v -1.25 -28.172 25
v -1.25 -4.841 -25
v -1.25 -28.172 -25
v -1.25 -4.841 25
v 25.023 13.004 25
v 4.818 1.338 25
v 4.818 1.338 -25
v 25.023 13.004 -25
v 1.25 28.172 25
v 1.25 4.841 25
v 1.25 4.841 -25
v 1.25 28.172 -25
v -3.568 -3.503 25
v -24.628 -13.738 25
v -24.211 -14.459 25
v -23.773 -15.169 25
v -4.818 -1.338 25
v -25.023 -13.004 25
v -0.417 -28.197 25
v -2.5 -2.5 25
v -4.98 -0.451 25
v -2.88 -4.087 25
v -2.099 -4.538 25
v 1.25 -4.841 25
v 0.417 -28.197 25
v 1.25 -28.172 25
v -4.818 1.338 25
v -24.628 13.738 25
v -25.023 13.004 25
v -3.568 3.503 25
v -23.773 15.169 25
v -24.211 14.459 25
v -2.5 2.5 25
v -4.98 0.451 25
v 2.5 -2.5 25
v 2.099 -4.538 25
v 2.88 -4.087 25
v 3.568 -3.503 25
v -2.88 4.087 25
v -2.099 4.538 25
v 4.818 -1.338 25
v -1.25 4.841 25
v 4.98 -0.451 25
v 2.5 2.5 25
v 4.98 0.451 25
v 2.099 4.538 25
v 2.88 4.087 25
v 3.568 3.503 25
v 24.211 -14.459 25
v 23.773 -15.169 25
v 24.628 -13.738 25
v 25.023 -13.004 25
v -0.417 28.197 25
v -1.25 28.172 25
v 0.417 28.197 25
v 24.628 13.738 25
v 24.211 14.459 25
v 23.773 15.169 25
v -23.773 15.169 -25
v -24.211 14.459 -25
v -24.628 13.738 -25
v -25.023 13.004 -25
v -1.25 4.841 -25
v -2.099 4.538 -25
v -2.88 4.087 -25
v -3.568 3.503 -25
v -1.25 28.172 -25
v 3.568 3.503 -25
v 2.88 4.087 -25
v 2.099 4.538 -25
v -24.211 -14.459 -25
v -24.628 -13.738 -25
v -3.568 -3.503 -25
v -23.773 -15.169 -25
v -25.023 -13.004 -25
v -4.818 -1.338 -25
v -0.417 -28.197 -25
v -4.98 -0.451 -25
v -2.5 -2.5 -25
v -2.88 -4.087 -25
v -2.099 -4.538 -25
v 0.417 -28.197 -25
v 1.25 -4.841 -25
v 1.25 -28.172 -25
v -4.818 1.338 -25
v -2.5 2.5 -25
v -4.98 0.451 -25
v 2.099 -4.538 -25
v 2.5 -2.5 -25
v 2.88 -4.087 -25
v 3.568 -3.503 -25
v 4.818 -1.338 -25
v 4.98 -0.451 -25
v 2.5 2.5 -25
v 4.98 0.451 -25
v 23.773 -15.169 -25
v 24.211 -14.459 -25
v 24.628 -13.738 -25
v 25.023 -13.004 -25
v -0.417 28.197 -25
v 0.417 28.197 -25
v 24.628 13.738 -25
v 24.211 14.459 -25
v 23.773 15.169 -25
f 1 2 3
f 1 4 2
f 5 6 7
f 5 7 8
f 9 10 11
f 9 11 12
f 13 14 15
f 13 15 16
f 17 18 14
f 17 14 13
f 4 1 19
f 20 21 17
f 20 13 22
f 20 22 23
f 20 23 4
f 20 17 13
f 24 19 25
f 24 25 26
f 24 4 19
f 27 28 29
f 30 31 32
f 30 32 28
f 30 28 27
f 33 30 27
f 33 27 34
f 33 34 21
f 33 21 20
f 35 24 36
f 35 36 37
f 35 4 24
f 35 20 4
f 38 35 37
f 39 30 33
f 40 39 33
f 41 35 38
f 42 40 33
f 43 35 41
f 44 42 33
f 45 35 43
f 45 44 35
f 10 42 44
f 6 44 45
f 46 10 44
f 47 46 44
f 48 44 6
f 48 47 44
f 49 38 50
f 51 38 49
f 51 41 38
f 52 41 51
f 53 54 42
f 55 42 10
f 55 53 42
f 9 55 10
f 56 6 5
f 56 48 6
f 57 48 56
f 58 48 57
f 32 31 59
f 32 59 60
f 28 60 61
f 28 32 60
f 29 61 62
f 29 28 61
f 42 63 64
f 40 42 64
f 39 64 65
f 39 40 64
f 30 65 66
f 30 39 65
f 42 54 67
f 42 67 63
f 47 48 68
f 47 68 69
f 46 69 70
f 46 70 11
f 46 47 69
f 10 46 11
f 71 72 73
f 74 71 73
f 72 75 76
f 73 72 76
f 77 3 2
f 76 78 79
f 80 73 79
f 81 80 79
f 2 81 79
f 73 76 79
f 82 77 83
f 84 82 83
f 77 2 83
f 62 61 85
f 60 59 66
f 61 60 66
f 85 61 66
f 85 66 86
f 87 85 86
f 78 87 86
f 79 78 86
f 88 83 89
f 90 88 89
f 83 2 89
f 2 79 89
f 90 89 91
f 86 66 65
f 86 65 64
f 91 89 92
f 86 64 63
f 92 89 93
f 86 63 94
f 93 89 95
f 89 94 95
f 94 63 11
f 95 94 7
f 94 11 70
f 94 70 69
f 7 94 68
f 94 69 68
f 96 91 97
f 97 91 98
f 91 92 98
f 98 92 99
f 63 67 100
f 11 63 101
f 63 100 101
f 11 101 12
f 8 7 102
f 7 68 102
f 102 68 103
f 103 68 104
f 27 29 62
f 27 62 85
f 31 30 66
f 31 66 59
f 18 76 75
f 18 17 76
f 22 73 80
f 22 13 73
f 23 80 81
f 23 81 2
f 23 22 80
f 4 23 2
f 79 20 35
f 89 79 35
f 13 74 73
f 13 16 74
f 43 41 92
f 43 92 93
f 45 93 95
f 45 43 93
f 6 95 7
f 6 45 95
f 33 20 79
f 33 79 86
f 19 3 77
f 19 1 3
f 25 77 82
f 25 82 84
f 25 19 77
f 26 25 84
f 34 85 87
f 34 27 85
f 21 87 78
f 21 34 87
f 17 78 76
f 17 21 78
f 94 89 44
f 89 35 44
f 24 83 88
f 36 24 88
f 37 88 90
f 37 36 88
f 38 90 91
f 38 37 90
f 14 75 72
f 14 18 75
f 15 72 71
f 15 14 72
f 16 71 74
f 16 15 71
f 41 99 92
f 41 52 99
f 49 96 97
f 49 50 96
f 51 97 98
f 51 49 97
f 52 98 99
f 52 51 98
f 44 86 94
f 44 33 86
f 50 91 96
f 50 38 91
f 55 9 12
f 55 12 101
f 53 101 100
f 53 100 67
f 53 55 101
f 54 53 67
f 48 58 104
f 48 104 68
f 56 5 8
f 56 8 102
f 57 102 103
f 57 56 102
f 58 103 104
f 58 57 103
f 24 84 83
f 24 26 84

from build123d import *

# Parameters (mm, degrees)
ESQUISSE1_W        = 5
ESQUISSE1_H        = 5
BOSS_EXTRU_1_DEPTH = 25


with BuildPart() as part:
    # Esquisse1 → Boss.-Extru.1 (new, symmetric)
    with BuildSketch(Plane.XY):
        with BuildLine():
            Line((25.022912308, -13.003609484), (4.817627458, -1.338082837))
            ThreePointArc((4.817627458, -1.338082837), (5, 0), (4.817627458, 1.338082837))
            Line((4.817627458, 1.338082837), (25.022912308, 13.003609484))
            ThreePointArc((25.022912308, 13.003609484), (24.421916387, 14.1), (23.772912308, 15.168672994))
            Line((23.772912308, 15.168672994), (3.567627458, 3.503146346))
            ThreePointArc((3.567627458, 3.503146346), (2.5, 4.330127019), (1.25, 4.841229183))
            Line((1.25, 4.841229183), (1.25, 28.172282478))
            ThreePointArc((1.25, 28.172282478), (0, 28.2), (-1.25, 28.172282478))
            Line((-1.25, 28.172282478), (-1.25, 4.841229183))
            ThreePointArc((-1.25, 4.841229183), (-2.5, 4.330127019), (-3.567627458, 3.503146346))
            Line((-3.567627458, 3.503146346), (-23.772912308, 15.168672994))
            ThreePointArc((-23.772912308, 15.168672994), (-24.421916387, 14.1), (-25.022912308, 13.003609484))
            Line((-25.022912308, 13.003609484), (-4.817627458, 1.338082837))
            ThreePointArc((-4.817627458, 1.338082837), (-5, 0), (-4.817627458, -1.338082837))
            Line((-4.817627458, -1.338082837), (-25.022912308, -13.003609484))
            ThreePointArc((-25.022912308, -13.003609484), (-24.421916387, -14.1), (-23.772912308, -15.168672994))
            Line((-23.772912308, -15.168672994), (-3.567627458, -3.503146346))
            ThreePointArc((-3.567627458, -3.503146346), (-2.5, -4.330127019), (-1.25, -4.841229183))
            Line((-1.25, -4.841229183), (-1.25, -28.172282478))
            ThreePointArc((-1.25, -28.172282478), (0, -28.2), (1.25, -28.172282478))
            Line((1.25, -28.172282478), (1.25, -4.841229183))
            ThreePointArc((1.25, -4.841229183), (2.5, -4.330127019), (3.567627458, -3.503146346))
            Line((3.567627458, -3.503146346), (23.772912308, -15.168672994))
            ThreePointArc((23.772912308, -15.168672994), (24.421916387, -14.1), (25.022912308, -13.003609484))
        make_face()
        Rectangle(ESQUISSE1_W, ESQUISSE1_H, mode=Mode.SUBTRACT)
    extrude(amount=BOSS_EXTRU_1_DEPTH, both=True)


solid = part.part
